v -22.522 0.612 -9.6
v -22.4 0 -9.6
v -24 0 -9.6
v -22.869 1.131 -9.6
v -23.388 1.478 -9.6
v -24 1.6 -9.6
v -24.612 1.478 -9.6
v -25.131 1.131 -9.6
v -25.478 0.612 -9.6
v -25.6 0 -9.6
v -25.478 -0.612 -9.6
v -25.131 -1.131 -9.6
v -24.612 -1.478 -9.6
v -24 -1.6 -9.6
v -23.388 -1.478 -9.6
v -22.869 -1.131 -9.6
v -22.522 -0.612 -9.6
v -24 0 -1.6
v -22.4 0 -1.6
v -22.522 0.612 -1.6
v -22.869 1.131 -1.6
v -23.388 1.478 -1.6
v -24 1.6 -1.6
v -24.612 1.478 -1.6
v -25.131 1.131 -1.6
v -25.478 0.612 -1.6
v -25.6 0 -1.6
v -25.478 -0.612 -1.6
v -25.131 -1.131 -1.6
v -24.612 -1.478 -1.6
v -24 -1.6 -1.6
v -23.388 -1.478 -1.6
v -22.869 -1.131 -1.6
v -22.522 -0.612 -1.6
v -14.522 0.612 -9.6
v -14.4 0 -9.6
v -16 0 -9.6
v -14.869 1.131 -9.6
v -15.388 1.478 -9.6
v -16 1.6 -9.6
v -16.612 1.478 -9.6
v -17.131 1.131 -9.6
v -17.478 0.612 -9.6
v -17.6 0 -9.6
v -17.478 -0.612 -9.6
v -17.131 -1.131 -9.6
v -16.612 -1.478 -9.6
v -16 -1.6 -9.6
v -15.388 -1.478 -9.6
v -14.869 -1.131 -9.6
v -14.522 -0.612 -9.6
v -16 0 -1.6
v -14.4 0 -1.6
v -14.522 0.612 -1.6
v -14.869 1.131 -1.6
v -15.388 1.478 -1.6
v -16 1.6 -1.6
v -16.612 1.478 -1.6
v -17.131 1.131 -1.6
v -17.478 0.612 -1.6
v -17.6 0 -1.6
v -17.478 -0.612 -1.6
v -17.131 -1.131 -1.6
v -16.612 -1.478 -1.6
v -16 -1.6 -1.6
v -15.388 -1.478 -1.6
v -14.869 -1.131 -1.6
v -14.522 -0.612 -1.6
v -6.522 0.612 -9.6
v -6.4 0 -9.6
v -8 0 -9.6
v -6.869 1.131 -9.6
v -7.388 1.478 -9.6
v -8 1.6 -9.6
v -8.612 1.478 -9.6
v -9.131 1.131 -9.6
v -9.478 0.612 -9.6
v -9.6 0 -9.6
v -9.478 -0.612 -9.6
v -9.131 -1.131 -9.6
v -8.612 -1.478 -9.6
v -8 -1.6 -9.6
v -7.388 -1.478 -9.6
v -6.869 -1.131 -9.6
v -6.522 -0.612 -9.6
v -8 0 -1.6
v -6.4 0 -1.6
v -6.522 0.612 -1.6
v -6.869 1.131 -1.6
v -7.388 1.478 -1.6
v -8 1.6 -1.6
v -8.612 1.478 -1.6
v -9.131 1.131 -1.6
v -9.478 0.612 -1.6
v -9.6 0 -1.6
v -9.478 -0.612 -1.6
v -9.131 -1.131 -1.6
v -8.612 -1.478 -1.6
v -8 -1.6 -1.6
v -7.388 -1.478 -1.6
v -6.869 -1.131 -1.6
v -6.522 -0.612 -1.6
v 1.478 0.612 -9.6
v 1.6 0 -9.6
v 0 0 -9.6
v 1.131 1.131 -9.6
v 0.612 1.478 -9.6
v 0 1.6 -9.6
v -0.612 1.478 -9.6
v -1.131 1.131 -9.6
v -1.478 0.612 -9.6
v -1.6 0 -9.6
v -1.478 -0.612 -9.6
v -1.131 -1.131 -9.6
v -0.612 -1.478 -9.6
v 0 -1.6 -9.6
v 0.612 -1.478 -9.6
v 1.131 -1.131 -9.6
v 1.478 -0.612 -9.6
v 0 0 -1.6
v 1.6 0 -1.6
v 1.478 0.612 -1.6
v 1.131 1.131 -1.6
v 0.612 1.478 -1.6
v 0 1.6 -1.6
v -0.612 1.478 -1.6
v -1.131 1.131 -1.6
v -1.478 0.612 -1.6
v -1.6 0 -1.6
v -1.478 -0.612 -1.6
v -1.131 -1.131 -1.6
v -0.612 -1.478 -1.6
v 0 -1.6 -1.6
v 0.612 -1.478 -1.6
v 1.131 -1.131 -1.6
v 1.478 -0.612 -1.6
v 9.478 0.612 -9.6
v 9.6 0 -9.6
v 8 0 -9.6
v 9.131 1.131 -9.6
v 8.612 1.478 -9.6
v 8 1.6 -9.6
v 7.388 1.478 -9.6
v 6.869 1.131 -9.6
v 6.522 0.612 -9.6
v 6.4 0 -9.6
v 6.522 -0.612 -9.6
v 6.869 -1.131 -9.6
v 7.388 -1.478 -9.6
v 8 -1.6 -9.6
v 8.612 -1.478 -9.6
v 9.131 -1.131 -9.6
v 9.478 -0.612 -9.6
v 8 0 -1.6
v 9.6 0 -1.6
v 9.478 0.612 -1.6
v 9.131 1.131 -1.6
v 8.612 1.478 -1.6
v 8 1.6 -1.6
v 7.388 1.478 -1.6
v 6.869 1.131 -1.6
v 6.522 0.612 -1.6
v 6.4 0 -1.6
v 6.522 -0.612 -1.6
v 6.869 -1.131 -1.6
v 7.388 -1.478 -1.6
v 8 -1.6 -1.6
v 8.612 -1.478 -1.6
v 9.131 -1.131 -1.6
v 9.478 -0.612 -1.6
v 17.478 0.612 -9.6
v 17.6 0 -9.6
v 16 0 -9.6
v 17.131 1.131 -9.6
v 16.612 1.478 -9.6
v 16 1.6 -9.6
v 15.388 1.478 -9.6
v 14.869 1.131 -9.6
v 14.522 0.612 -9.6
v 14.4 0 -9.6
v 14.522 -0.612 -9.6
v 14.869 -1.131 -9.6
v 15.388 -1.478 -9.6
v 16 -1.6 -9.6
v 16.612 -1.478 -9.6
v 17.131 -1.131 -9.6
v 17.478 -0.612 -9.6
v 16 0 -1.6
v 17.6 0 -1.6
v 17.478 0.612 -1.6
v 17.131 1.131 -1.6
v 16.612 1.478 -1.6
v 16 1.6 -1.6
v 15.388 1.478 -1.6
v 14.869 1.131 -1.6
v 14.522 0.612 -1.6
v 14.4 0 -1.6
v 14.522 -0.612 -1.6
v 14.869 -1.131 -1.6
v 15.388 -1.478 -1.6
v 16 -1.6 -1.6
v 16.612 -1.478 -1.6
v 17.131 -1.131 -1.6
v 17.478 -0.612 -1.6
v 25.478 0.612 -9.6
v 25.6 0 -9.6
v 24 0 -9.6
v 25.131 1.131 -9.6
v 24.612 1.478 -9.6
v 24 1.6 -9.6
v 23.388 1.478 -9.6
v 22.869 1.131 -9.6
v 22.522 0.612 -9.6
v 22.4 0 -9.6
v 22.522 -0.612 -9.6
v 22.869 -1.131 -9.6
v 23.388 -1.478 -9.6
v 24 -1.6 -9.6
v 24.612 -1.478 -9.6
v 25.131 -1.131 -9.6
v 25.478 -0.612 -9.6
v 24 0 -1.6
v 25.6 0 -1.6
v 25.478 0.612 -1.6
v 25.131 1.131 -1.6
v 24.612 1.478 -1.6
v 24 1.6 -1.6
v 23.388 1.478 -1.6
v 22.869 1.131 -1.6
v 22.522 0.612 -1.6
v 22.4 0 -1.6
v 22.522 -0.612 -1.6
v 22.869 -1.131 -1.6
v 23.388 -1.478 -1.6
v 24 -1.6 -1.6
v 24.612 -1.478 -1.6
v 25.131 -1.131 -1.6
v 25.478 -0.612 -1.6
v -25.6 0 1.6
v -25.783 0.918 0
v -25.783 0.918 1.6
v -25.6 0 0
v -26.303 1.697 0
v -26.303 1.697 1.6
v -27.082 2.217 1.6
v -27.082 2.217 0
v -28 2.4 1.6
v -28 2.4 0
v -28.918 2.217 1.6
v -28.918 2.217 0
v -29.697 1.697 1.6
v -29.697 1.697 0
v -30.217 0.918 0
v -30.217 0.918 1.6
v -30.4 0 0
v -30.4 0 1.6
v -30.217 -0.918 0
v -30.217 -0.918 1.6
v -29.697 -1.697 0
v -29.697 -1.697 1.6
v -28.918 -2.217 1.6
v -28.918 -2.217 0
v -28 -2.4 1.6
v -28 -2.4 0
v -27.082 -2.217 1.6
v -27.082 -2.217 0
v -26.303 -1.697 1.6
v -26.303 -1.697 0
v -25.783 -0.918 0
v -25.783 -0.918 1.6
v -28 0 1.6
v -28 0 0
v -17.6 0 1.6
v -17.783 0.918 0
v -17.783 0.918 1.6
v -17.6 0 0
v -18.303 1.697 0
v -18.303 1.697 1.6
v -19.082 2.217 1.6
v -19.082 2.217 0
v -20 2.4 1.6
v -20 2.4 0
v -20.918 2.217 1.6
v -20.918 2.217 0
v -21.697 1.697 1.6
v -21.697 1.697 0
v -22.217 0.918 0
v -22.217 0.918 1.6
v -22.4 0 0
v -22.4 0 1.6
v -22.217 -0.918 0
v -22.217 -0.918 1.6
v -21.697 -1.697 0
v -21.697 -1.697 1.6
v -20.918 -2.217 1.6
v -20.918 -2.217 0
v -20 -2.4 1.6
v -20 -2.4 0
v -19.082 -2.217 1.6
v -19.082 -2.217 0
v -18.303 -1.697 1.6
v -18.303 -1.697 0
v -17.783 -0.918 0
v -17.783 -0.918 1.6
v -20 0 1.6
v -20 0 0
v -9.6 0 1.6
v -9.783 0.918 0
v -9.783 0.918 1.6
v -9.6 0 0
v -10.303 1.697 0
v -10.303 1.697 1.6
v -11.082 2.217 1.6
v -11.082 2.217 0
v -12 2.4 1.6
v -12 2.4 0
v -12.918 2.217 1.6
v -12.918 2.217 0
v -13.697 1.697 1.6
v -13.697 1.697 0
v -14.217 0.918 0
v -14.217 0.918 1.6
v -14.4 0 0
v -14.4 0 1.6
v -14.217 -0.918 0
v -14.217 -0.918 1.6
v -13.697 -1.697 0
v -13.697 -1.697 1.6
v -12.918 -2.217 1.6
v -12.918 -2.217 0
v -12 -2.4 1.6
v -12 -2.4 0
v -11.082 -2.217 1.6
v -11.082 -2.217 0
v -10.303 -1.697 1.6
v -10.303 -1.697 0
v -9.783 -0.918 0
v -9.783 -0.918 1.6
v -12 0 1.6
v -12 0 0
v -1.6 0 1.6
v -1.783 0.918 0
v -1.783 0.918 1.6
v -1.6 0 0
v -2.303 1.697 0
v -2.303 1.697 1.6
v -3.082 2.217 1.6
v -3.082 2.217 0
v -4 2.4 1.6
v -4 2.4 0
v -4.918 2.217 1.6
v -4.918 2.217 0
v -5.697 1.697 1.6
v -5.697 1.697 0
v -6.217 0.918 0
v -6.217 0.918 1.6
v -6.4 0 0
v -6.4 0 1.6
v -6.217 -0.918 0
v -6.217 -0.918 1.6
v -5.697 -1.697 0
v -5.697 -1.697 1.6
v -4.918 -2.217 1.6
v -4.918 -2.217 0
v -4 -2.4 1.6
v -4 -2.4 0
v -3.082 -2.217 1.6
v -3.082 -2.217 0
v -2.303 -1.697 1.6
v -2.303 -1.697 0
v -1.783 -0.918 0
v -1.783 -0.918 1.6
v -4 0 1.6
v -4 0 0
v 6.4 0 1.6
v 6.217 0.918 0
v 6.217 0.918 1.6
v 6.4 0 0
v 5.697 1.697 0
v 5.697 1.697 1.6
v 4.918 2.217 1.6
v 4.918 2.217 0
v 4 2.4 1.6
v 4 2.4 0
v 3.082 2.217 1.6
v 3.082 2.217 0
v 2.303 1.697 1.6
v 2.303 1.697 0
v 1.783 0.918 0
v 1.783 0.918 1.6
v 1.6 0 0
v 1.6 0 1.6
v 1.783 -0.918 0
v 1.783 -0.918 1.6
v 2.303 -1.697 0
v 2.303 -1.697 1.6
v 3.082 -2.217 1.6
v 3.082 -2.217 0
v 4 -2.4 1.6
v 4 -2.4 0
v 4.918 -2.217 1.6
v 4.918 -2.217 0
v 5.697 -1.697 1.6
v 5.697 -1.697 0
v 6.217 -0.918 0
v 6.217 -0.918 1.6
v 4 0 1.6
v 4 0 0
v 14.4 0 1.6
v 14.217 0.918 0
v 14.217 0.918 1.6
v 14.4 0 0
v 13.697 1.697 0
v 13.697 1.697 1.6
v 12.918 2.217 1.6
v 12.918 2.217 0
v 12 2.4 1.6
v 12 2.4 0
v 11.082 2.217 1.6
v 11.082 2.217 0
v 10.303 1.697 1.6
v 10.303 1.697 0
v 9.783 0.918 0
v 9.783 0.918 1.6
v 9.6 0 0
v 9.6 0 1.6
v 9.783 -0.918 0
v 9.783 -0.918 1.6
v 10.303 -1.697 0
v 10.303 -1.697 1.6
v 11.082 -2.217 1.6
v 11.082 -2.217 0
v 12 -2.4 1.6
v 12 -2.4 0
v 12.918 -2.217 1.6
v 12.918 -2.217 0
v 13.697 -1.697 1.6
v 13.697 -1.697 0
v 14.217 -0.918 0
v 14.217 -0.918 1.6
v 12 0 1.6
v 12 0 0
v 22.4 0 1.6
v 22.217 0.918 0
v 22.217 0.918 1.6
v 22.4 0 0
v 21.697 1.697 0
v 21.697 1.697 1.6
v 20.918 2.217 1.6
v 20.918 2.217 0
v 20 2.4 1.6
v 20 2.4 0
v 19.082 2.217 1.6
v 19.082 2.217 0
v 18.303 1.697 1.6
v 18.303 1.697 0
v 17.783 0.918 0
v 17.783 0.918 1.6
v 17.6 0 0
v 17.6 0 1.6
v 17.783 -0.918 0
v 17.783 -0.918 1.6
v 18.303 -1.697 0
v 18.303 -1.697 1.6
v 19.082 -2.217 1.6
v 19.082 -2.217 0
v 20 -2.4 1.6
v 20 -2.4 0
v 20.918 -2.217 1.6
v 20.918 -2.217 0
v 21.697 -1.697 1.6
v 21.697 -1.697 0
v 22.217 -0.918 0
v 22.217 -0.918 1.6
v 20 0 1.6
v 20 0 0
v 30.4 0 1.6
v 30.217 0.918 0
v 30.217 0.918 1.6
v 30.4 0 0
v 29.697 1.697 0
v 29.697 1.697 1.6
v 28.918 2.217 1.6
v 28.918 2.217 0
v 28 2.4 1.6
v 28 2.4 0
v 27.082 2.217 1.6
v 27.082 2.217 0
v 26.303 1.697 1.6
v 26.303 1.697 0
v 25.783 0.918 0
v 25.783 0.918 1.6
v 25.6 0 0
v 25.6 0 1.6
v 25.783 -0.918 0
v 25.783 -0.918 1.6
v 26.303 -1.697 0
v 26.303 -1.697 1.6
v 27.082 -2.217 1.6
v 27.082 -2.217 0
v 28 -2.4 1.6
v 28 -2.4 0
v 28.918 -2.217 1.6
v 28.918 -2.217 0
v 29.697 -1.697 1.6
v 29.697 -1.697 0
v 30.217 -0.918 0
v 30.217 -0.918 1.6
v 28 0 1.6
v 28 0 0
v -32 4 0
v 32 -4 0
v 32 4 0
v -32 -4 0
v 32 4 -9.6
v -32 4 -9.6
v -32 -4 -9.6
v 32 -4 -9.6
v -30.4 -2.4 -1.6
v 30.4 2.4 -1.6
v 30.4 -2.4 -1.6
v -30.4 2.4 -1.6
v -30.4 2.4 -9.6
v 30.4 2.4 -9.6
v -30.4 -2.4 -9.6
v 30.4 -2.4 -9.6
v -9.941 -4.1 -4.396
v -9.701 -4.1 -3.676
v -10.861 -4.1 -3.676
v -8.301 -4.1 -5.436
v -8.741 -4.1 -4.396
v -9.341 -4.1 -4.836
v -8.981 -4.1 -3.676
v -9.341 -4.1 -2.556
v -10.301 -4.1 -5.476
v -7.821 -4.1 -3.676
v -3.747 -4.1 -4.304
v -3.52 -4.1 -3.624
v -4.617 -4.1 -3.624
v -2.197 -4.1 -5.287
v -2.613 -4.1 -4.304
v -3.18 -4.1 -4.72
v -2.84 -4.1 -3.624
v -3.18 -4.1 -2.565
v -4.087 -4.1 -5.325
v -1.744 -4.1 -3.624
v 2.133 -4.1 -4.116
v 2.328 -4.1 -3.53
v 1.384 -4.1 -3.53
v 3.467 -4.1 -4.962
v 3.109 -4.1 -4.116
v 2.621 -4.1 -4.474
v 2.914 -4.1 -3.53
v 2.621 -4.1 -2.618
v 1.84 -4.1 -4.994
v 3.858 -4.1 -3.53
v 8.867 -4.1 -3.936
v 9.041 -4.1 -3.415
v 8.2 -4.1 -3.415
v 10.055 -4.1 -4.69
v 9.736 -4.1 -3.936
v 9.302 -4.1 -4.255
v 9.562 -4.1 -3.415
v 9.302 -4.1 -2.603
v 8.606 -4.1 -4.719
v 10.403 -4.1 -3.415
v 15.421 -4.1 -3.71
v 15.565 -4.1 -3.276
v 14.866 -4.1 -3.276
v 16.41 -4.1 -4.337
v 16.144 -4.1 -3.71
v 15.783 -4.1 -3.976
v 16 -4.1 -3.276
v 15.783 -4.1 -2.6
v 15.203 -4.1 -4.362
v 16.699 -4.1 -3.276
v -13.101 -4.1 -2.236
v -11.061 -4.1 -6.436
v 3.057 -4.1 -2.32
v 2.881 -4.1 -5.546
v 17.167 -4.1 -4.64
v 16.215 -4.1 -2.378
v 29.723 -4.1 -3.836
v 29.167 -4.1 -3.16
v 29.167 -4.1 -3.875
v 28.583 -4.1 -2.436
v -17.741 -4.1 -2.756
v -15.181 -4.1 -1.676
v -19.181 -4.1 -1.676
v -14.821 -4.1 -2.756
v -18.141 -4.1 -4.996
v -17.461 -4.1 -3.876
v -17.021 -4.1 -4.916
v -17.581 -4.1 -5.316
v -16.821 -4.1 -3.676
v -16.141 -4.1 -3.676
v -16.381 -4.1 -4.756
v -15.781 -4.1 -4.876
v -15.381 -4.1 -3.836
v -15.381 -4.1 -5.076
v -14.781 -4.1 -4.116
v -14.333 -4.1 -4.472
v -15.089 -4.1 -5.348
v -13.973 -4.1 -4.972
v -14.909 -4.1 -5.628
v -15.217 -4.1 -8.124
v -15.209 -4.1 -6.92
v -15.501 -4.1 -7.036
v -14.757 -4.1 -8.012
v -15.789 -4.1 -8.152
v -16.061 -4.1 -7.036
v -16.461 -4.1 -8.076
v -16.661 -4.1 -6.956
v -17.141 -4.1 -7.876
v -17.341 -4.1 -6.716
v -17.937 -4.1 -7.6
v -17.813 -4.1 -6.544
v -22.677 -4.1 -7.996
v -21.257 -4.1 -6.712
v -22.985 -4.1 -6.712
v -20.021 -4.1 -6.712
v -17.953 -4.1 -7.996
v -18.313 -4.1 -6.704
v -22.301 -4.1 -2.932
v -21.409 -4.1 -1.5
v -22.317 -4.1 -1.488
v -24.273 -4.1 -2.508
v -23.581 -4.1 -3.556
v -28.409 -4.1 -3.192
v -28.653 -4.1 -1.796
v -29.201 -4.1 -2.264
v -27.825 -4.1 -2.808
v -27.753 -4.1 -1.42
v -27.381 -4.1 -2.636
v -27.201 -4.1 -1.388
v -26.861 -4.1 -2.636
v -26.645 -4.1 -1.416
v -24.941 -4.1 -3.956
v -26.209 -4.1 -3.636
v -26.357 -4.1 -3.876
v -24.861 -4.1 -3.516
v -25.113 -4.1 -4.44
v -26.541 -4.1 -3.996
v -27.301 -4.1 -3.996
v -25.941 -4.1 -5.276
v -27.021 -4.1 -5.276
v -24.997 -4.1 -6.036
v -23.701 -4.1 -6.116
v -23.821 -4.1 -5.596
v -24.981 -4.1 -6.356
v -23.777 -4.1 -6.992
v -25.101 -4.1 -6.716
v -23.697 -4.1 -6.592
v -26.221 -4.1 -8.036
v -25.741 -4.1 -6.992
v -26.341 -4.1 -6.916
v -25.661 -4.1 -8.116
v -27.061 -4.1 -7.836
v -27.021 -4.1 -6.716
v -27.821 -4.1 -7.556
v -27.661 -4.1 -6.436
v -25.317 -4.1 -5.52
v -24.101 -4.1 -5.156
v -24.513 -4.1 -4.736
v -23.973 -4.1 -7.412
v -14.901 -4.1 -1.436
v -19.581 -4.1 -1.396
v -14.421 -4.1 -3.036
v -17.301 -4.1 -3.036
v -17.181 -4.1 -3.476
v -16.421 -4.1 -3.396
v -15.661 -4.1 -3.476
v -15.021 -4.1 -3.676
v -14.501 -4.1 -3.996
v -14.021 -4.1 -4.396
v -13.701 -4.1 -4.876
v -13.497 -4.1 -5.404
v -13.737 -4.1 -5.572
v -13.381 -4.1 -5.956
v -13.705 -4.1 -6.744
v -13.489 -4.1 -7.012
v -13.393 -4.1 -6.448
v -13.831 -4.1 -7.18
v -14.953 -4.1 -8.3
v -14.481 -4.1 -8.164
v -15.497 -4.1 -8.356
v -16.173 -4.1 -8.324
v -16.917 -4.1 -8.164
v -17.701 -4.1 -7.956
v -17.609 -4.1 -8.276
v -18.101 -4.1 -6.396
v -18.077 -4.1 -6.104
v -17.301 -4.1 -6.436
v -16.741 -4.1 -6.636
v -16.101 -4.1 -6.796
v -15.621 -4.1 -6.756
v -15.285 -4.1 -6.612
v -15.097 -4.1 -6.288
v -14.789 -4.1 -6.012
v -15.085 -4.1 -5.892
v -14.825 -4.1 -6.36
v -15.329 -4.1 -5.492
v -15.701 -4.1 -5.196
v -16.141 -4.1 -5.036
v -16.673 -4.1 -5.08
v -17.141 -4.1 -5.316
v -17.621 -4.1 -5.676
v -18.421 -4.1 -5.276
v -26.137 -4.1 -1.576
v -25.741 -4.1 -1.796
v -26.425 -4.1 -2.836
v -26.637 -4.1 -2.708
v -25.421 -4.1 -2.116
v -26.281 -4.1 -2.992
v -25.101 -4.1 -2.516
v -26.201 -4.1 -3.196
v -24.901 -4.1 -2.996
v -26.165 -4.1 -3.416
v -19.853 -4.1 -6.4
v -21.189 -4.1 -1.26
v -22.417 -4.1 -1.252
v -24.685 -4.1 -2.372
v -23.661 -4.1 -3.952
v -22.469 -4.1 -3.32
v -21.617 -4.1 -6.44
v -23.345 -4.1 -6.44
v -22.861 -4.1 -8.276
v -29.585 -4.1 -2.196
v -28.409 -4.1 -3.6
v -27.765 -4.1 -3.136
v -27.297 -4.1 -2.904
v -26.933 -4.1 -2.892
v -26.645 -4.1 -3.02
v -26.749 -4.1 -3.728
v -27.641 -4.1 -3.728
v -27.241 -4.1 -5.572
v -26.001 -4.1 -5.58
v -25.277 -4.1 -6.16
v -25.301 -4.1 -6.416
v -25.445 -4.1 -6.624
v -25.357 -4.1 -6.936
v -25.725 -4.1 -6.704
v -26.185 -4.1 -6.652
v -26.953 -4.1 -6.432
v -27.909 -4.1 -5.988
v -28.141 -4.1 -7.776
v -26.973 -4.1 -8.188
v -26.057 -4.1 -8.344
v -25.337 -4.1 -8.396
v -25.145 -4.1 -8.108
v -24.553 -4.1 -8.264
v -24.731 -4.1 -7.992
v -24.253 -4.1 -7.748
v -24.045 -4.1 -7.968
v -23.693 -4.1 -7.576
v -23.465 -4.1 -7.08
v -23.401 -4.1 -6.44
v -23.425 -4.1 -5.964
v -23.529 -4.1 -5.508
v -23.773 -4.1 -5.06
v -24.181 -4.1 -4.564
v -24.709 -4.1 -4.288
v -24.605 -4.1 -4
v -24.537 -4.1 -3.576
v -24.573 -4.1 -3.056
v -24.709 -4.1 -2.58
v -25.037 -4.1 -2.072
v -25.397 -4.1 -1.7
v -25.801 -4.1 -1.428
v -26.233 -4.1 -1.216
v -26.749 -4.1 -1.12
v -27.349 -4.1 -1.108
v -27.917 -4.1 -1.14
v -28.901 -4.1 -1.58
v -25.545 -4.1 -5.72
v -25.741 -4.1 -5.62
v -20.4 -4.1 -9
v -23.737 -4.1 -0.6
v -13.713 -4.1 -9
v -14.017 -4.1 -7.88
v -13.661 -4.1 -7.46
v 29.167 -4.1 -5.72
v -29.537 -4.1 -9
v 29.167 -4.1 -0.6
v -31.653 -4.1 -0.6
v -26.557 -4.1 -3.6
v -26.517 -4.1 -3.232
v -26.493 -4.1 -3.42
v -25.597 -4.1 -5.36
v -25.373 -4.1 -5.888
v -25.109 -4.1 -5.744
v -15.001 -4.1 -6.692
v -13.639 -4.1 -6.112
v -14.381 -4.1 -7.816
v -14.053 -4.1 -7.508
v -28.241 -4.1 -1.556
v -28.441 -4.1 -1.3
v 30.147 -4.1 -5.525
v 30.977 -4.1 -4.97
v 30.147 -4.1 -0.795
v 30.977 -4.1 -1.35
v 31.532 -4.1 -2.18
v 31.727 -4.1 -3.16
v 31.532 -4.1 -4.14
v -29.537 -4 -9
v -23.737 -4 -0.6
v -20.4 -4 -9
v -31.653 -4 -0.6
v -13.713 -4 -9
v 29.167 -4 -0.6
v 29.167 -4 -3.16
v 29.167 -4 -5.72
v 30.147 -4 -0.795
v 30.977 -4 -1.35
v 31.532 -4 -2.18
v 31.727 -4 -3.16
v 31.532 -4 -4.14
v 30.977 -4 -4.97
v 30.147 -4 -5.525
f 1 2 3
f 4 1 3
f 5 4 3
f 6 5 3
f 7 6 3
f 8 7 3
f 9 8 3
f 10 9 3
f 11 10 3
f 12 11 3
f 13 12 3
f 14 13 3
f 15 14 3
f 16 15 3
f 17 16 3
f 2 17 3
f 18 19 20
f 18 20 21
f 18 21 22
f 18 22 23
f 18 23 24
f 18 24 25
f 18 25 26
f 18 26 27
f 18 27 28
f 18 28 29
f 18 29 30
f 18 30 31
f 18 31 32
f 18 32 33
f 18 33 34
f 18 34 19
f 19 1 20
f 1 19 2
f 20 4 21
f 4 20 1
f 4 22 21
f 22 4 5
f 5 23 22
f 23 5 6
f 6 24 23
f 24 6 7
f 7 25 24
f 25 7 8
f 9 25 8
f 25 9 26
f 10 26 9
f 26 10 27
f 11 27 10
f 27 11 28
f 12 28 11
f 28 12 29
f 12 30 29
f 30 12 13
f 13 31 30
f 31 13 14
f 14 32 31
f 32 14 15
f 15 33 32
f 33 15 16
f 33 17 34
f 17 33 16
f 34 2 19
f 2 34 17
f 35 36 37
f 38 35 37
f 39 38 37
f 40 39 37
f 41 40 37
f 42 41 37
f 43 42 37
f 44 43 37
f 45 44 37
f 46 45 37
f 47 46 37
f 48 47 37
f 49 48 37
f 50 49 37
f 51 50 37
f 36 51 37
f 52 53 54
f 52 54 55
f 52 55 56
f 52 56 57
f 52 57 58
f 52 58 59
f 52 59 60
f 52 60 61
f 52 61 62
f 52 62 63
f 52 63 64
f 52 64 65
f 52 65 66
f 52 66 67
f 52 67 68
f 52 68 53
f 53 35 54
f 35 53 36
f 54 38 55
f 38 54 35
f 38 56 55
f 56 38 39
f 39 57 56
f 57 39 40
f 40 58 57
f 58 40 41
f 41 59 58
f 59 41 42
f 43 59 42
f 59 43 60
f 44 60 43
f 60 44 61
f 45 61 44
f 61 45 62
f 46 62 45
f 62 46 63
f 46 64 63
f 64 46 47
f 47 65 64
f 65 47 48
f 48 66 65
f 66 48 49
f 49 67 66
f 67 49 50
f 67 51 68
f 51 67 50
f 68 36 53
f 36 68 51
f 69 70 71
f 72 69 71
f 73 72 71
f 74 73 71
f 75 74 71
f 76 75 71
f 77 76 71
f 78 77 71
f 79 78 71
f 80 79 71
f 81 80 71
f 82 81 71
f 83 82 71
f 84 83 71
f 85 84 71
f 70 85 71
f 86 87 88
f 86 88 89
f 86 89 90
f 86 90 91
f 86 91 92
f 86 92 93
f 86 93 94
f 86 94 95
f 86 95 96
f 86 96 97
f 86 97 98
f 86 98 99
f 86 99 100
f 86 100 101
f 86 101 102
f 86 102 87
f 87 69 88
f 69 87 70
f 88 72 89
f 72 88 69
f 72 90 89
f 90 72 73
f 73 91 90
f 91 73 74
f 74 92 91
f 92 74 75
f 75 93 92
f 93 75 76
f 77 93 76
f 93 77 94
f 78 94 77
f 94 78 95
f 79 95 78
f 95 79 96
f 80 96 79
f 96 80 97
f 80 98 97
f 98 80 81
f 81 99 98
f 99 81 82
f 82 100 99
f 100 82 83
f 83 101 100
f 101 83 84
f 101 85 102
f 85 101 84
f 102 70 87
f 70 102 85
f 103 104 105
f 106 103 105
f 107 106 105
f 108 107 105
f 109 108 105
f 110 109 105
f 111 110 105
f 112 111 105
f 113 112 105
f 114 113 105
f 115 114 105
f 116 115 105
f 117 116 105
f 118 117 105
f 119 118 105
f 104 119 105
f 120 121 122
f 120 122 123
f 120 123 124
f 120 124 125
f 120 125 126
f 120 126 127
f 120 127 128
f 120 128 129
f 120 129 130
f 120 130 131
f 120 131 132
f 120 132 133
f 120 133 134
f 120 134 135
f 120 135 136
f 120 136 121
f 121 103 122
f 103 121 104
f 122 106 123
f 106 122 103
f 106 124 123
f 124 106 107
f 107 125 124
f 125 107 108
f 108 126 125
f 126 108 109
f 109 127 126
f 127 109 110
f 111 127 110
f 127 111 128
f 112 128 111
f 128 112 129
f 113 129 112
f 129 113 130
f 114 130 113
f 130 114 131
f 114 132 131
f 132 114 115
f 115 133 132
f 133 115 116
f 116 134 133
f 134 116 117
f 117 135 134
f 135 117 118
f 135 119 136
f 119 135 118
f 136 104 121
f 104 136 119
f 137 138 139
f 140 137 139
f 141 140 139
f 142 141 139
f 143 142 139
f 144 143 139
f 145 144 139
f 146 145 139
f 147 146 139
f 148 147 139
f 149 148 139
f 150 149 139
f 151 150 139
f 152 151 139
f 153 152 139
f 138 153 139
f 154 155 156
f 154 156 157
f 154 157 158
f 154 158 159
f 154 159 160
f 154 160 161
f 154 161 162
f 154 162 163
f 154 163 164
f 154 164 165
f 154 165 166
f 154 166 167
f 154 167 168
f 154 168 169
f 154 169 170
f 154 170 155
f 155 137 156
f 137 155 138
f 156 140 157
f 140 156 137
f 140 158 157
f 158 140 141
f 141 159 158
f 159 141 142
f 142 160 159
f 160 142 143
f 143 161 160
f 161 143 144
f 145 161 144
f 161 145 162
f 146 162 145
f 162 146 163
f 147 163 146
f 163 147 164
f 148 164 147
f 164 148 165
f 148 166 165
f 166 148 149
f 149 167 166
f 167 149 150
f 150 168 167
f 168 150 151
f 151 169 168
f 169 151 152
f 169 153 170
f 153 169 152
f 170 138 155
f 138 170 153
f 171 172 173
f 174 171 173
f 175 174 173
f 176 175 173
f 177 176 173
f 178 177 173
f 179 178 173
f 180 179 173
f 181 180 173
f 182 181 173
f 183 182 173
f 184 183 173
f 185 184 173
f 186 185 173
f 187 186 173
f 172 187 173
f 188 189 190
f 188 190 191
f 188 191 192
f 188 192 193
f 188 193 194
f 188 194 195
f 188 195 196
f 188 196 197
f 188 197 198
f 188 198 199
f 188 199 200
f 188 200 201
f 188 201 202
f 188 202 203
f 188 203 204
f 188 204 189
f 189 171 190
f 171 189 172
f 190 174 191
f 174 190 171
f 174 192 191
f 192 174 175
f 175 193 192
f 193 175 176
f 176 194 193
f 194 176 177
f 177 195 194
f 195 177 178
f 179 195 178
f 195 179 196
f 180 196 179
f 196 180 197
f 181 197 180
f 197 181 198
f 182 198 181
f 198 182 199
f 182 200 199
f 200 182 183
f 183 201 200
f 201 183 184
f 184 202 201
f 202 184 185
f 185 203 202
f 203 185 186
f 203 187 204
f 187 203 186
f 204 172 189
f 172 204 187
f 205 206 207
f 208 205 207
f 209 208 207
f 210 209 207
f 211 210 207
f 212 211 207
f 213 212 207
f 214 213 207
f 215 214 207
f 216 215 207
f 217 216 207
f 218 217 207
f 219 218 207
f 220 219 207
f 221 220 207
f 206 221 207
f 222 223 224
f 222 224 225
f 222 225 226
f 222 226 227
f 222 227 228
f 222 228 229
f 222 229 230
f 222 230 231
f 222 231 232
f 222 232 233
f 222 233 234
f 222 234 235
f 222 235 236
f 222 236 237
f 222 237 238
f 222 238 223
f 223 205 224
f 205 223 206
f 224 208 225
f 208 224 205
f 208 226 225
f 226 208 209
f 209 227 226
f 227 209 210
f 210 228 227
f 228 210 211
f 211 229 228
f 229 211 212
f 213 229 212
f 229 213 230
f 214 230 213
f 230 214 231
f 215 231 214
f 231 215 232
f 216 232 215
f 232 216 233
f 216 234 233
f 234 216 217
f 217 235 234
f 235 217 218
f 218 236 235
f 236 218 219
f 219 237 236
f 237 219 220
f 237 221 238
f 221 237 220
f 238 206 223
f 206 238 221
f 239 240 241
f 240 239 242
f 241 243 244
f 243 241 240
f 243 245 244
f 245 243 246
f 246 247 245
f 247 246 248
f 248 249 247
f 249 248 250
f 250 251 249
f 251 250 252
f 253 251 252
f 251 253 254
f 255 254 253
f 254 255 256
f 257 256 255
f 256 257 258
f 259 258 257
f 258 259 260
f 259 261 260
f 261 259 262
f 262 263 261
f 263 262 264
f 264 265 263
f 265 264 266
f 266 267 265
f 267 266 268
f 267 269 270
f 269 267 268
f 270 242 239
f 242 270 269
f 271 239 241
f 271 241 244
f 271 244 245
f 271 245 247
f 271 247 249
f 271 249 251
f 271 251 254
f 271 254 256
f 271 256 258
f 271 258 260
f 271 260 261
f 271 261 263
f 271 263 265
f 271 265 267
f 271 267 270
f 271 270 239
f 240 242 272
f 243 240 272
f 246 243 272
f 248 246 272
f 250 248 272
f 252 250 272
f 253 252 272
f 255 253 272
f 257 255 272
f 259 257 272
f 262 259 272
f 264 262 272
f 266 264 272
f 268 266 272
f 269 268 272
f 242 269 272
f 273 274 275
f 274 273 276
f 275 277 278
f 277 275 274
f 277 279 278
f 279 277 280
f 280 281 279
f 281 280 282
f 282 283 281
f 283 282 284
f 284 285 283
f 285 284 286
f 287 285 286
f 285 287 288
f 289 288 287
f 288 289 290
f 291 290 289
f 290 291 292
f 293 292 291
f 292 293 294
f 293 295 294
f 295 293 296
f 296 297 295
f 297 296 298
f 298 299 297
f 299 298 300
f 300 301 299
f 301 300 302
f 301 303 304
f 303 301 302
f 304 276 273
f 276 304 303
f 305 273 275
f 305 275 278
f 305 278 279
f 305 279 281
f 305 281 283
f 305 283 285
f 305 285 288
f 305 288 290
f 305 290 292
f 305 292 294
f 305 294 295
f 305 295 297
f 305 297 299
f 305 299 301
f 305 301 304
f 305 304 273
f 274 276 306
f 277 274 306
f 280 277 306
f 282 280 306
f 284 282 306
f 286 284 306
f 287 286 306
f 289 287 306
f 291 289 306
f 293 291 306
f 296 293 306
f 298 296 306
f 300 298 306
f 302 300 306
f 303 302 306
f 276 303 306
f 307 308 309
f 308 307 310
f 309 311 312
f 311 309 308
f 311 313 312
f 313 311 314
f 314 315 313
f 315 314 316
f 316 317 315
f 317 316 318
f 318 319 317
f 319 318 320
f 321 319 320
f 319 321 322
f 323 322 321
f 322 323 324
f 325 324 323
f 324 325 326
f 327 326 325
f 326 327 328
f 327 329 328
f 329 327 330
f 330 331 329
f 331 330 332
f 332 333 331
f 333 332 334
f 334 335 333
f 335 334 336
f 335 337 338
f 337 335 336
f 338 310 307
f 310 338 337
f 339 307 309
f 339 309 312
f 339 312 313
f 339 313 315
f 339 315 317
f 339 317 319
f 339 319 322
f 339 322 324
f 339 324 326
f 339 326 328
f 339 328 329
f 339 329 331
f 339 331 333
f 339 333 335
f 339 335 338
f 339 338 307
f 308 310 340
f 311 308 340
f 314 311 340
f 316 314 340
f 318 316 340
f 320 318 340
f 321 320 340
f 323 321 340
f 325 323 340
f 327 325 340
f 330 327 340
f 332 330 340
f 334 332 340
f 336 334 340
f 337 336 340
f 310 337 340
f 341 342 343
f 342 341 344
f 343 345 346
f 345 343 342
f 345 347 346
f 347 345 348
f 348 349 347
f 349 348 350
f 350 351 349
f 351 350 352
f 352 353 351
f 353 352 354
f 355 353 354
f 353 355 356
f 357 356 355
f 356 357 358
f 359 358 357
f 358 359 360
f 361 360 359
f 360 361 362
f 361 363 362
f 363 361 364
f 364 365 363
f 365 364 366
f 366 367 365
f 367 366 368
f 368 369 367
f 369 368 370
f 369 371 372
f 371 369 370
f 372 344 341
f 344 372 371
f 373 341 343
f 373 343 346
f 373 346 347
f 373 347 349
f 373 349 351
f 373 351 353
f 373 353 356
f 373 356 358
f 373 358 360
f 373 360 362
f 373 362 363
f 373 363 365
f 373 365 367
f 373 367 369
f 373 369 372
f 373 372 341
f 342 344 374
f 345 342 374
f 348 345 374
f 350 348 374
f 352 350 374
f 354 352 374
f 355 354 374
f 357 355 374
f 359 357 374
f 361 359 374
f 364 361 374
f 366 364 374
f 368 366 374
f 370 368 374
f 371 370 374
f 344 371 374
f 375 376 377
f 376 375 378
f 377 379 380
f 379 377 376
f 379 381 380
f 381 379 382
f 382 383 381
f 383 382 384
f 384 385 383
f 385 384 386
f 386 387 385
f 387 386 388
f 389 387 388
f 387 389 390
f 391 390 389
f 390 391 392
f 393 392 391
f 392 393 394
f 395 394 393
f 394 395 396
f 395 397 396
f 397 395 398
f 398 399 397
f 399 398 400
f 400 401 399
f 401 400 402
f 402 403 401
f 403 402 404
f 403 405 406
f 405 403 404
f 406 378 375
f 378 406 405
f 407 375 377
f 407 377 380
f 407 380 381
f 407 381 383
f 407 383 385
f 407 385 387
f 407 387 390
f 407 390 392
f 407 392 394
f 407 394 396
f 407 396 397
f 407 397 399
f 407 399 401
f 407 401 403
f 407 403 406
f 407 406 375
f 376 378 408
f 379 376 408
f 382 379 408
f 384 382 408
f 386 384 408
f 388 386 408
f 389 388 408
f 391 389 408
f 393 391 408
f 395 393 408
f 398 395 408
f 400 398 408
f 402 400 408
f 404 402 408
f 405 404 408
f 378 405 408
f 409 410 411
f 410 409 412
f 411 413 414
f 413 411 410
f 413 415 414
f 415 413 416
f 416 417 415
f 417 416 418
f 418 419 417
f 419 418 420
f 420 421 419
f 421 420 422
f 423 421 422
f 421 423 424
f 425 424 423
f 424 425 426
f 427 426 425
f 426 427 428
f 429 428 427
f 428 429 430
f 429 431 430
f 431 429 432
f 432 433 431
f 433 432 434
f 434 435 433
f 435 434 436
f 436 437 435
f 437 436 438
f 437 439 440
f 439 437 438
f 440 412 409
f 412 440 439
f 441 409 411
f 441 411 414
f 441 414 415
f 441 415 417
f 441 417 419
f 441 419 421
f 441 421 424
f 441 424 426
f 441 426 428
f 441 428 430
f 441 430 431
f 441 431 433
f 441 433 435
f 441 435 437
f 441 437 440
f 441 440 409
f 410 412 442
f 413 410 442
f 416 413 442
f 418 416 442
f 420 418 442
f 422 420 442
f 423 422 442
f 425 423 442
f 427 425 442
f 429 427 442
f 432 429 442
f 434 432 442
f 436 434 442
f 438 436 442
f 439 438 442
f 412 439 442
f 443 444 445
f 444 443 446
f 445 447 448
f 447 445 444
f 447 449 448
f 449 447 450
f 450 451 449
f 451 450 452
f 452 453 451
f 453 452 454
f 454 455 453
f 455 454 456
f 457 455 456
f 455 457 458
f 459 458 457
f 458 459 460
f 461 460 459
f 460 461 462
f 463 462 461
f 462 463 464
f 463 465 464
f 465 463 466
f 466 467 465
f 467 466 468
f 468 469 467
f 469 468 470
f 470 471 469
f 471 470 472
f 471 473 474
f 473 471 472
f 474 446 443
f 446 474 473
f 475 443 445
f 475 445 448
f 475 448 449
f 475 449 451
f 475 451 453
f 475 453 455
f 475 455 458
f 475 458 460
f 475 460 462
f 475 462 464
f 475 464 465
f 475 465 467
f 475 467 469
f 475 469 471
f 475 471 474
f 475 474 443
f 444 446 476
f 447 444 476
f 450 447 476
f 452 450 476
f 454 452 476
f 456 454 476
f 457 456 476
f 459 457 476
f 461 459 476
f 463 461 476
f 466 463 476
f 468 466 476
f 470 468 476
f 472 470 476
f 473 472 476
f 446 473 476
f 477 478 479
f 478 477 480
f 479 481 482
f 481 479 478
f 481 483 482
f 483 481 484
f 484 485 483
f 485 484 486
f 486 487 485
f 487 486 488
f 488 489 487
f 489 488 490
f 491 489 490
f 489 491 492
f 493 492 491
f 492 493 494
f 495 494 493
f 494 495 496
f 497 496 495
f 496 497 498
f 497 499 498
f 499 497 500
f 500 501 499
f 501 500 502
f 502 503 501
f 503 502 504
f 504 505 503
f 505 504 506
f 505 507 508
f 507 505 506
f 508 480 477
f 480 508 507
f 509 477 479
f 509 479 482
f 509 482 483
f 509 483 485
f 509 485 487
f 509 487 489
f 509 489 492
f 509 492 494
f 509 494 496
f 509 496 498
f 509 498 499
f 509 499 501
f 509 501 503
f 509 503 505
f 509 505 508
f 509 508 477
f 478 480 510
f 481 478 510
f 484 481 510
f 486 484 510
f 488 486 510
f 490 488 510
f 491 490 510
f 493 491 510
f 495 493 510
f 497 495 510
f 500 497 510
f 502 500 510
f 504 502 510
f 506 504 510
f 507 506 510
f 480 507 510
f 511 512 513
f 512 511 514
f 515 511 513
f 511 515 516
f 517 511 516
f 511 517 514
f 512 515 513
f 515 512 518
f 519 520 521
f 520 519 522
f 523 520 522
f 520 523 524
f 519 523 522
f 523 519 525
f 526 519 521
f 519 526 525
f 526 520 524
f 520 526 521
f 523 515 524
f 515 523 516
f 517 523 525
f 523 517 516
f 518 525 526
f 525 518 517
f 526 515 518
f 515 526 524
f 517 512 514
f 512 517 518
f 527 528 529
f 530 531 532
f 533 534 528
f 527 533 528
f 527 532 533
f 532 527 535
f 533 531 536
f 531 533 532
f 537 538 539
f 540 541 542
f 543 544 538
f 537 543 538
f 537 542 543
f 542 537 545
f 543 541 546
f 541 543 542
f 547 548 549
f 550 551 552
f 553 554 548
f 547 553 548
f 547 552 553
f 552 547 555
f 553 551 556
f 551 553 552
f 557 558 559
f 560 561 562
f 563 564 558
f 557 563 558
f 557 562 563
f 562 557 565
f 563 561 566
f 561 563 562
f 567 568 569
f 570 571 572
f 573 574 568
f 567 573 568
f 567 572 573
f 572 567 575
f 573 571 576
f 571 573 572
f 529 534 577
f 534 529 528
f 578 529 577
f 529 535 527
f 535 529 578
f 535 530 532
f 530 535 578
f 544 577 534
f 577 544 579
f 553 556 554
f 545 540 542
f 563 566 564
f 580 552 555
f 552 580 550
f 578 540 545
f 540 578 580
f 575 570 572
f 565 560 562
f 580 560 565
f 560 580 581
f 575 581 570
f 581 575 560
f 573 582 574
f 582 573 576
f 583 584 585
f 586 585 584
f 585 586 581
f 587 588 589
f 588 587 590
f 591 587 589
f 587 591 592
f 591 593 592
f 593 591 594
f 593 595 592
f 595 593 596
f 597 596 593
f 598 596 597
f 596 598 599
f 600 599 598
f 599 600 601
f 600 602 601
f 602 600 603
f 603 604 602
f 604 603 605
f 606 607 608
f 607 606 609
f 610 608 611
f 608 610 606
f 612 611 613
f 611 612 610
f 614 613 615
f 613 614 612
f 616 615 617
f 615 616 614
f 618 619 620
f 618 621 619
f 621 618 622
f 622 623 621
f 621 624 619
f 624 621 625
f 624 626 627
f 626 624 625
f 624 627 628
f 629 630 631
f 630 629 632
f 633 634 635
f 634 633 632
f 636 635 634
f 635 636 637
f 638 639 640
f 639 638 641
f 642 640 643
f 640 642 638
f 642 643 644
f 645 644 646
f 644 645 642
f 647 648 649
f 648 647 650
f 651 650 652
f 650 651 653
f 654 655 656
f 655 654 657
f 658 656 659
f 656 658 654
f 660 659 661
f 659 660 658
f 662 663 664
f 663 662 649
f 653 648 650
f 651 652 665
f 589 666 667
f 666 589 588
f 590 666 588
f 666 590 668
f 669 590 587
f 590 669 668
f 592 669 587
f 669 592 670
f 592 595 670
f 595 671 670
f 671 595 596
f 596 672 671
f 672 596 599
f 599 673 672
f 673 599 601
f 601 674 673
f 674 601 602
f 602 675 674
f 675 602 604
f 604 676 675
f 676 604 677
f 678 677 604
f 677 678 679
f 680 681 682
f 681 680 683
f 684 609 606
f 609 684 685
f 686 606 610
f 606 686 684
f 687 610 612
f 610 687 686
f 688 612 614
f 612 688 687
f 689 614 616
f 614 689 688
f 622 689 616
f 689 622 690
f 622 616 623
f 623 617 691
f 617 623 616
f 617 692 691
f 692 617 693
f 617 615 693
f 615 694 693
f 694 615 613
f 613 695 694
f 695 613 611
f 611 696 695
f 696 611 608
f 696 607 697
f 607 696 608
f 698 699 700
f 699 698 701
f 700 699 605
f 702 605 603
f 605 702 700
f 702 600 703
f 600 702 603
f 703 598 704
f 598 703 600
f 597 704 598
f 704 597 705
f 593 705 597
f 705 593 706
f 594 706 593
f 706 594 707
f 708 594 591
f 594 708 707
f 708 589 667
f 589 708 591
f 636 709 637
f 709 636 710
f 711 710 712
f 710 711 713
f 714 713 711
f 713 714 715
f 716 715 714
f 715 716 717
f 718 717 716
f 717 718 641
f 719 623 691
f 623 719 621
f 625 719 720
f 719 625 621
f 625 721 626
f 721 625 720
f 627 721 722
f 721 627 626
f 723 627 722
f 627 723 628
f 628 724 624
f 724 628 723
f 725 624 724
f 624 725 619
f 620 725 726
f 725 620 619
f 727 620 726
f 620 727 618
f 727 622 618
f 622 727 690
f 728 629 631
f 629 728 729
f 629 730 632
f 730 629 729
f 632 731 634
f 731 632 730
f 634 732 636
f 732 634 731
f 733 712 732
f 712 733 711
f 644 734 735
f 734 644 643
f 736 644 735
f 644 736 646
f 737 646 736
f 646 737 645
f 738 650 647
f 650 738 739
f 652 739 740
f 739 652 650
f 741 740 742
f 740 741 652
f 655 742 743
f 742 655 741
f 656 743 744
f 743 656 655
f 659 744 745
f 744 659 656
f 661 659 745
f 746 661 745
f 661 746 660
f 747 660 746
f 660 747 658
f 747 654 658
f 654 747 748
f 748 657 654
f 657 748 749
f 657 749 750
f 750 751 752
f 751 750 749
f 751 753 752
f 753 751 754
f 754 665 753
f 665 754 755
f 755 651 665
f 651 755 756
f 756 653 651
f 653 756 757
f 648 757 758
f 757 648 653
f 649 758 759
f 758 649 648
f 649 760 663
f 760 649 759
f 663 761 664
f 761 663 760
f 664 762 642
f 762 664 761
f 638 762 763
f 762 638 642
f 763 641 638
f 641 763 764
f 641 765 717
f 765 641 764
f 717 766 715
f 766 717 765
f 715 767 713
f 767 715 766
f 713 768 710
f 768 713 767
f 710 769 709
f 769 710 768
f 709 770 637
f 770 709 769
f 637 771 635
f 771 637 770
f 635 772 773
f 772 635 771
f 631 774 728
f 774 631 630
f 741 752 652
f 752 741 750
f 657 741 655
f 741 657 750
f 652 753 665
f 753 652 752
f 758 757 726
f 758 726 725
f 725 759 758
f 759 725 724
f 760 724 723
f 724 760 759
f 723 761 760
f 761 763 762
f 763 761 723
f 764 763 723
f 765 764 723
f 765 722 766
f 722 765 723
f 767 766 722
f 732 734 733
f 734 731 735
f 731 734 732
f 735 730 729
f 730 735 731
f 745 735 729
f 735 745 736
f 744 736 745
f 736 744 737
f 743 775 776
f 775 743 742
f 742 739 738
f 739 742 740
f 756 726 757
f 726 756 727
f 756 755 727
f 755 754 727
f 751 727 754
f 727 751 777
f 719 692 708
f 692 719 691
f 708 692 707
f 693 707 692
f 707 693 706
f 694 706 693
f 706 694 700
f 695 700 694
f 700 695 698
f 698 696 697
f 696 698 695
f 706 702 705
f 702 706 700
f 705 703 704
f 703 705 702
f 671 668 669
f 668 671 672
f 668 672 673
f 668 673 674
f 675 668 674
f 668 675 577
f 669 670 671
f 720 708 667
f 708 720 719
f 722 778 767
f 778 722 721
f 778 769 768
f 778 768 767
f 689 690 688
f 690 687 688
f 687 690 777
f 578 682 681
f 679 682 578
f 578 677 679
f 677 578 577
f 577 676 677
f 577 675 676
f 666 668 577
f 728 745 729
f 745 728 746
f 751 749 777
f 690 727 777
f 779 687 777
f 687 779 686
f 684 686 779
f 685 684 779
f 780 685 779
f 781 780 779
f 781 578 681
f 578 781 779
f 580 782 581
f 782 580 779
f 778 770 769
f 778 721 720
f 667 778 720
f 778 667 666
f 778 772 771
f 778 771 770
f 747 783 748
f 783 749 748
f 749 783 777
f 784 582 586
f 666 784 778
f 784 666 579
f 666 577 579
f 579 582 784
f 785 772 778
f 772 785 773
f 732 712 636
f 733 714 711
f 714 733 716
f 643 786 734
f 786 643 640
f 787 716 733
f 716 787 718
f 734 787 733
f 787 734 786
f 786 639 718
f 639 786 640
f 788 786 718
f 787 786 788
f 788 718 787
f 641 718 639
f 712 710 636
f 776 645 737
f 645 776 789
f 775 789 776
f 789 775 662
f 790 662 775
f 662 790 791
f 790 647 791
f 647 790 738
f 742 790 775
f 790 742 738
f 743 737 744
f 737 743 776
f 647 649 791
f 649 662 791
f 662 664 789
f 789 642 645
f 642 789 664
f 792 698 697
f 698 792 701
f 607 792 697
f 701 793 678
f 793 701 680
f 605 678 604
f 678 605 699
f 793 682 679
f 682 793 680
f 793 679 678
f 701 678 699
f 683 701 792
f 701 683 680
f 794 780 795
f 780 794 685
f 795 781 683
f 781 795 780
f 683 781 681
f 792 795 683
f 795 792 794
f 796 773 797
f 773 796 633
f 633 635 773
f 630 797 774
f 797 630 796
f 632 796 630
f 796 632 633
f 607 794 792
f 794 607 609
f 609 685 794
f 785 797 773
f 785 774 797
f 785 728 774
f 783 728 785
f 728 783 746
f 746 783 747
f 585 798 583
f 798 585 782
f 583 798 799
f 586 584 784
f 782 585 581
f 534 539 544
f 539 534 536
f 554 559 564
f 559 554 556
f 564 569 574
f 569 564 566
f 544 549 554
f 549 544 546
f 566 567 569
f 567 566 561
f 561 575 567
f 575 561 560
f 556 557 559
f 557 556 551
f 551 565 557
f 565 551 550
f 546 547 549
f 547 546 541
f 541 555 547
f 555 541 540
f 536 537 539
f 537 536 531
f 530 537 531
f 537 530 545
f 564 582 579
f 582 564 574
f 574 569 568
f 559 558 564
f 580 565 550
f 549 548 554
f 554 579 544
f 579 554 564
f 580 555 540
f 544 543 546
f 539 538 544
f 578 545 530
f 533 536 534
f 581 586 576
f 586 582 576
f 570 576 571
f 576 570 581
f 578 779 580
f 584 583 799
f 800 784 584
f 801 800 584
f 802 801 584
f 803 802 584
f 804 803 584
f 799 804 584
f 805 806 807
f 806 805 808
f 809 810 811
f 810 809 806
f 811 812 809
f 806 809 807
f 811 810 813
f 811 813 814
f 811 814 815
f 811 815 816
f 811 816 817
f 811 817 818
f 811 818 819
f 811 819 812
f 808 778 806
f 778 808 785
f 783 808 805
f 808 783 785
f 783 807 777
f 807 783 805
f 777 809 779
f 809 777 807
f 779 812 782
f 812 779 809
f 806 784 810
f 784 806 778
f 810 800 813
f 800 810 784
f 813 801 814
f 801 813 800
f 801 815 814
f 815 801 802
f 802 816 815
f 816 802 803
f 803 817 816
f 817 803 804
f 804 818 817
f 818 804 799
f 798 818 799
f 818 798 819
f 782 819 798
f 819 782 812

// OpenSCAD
use <../lib.scad>
use <169595a.scad>
use <3008.scad>
function ldraw_lib__3008d00() = [
// 0 Brick  1 x  8 with "315" and Red Stripe with Stars - Right Sticker
// 0 Name: 3008d00.dat
// 0 Author: Takeshi Takahashi [RainbowDolphin]
// 0 !LDRAW_ORG Shortcut UPDATE 2026-08
// 0 !LICENSE Licensed under CC BY 4.0 : see CAreadme.txt
// 
// 0 BFC CERTIFY CCW
  [0,"BFC","CERTIFY"],
  [0,"BFC","CCW"],
// 
// 0 !CATEGORY Sticker Shortcut
// 0 !KEYWORDS Bricklink 3008pb051L, Set 6596, Speedboat, Wave Master
// 
// 0 !HISTORY 2026-08-31 [OrionP] Official Update 2026-08
// 
// 1 16 0 0 0 1 0 0 0 1 0 0 0 1 3008.dat
  [1,16,0,0,0,1,0,0,0,1,0,0,0,1, ldraw_lib__3008()],
// 1 16 0 12 -10 1 0 0 0 0 -1 0 1 0 169595a.dat
  [1,16,0,12,-10,1,0,0,0,0,-1,0,1,0, ldraw_lib__169595a()],
];
module ldraw_lib__3008d00(step=0, col=false, unit=2/5, alt=false, line=0.2, solid=!$preview)
    makepoly(ldraw_lib__3008d00(), step=step, col=col, unit=unit, alt=alt, line=line, solid=solid);
ldraw_lib__3008d00(line=0.2);
